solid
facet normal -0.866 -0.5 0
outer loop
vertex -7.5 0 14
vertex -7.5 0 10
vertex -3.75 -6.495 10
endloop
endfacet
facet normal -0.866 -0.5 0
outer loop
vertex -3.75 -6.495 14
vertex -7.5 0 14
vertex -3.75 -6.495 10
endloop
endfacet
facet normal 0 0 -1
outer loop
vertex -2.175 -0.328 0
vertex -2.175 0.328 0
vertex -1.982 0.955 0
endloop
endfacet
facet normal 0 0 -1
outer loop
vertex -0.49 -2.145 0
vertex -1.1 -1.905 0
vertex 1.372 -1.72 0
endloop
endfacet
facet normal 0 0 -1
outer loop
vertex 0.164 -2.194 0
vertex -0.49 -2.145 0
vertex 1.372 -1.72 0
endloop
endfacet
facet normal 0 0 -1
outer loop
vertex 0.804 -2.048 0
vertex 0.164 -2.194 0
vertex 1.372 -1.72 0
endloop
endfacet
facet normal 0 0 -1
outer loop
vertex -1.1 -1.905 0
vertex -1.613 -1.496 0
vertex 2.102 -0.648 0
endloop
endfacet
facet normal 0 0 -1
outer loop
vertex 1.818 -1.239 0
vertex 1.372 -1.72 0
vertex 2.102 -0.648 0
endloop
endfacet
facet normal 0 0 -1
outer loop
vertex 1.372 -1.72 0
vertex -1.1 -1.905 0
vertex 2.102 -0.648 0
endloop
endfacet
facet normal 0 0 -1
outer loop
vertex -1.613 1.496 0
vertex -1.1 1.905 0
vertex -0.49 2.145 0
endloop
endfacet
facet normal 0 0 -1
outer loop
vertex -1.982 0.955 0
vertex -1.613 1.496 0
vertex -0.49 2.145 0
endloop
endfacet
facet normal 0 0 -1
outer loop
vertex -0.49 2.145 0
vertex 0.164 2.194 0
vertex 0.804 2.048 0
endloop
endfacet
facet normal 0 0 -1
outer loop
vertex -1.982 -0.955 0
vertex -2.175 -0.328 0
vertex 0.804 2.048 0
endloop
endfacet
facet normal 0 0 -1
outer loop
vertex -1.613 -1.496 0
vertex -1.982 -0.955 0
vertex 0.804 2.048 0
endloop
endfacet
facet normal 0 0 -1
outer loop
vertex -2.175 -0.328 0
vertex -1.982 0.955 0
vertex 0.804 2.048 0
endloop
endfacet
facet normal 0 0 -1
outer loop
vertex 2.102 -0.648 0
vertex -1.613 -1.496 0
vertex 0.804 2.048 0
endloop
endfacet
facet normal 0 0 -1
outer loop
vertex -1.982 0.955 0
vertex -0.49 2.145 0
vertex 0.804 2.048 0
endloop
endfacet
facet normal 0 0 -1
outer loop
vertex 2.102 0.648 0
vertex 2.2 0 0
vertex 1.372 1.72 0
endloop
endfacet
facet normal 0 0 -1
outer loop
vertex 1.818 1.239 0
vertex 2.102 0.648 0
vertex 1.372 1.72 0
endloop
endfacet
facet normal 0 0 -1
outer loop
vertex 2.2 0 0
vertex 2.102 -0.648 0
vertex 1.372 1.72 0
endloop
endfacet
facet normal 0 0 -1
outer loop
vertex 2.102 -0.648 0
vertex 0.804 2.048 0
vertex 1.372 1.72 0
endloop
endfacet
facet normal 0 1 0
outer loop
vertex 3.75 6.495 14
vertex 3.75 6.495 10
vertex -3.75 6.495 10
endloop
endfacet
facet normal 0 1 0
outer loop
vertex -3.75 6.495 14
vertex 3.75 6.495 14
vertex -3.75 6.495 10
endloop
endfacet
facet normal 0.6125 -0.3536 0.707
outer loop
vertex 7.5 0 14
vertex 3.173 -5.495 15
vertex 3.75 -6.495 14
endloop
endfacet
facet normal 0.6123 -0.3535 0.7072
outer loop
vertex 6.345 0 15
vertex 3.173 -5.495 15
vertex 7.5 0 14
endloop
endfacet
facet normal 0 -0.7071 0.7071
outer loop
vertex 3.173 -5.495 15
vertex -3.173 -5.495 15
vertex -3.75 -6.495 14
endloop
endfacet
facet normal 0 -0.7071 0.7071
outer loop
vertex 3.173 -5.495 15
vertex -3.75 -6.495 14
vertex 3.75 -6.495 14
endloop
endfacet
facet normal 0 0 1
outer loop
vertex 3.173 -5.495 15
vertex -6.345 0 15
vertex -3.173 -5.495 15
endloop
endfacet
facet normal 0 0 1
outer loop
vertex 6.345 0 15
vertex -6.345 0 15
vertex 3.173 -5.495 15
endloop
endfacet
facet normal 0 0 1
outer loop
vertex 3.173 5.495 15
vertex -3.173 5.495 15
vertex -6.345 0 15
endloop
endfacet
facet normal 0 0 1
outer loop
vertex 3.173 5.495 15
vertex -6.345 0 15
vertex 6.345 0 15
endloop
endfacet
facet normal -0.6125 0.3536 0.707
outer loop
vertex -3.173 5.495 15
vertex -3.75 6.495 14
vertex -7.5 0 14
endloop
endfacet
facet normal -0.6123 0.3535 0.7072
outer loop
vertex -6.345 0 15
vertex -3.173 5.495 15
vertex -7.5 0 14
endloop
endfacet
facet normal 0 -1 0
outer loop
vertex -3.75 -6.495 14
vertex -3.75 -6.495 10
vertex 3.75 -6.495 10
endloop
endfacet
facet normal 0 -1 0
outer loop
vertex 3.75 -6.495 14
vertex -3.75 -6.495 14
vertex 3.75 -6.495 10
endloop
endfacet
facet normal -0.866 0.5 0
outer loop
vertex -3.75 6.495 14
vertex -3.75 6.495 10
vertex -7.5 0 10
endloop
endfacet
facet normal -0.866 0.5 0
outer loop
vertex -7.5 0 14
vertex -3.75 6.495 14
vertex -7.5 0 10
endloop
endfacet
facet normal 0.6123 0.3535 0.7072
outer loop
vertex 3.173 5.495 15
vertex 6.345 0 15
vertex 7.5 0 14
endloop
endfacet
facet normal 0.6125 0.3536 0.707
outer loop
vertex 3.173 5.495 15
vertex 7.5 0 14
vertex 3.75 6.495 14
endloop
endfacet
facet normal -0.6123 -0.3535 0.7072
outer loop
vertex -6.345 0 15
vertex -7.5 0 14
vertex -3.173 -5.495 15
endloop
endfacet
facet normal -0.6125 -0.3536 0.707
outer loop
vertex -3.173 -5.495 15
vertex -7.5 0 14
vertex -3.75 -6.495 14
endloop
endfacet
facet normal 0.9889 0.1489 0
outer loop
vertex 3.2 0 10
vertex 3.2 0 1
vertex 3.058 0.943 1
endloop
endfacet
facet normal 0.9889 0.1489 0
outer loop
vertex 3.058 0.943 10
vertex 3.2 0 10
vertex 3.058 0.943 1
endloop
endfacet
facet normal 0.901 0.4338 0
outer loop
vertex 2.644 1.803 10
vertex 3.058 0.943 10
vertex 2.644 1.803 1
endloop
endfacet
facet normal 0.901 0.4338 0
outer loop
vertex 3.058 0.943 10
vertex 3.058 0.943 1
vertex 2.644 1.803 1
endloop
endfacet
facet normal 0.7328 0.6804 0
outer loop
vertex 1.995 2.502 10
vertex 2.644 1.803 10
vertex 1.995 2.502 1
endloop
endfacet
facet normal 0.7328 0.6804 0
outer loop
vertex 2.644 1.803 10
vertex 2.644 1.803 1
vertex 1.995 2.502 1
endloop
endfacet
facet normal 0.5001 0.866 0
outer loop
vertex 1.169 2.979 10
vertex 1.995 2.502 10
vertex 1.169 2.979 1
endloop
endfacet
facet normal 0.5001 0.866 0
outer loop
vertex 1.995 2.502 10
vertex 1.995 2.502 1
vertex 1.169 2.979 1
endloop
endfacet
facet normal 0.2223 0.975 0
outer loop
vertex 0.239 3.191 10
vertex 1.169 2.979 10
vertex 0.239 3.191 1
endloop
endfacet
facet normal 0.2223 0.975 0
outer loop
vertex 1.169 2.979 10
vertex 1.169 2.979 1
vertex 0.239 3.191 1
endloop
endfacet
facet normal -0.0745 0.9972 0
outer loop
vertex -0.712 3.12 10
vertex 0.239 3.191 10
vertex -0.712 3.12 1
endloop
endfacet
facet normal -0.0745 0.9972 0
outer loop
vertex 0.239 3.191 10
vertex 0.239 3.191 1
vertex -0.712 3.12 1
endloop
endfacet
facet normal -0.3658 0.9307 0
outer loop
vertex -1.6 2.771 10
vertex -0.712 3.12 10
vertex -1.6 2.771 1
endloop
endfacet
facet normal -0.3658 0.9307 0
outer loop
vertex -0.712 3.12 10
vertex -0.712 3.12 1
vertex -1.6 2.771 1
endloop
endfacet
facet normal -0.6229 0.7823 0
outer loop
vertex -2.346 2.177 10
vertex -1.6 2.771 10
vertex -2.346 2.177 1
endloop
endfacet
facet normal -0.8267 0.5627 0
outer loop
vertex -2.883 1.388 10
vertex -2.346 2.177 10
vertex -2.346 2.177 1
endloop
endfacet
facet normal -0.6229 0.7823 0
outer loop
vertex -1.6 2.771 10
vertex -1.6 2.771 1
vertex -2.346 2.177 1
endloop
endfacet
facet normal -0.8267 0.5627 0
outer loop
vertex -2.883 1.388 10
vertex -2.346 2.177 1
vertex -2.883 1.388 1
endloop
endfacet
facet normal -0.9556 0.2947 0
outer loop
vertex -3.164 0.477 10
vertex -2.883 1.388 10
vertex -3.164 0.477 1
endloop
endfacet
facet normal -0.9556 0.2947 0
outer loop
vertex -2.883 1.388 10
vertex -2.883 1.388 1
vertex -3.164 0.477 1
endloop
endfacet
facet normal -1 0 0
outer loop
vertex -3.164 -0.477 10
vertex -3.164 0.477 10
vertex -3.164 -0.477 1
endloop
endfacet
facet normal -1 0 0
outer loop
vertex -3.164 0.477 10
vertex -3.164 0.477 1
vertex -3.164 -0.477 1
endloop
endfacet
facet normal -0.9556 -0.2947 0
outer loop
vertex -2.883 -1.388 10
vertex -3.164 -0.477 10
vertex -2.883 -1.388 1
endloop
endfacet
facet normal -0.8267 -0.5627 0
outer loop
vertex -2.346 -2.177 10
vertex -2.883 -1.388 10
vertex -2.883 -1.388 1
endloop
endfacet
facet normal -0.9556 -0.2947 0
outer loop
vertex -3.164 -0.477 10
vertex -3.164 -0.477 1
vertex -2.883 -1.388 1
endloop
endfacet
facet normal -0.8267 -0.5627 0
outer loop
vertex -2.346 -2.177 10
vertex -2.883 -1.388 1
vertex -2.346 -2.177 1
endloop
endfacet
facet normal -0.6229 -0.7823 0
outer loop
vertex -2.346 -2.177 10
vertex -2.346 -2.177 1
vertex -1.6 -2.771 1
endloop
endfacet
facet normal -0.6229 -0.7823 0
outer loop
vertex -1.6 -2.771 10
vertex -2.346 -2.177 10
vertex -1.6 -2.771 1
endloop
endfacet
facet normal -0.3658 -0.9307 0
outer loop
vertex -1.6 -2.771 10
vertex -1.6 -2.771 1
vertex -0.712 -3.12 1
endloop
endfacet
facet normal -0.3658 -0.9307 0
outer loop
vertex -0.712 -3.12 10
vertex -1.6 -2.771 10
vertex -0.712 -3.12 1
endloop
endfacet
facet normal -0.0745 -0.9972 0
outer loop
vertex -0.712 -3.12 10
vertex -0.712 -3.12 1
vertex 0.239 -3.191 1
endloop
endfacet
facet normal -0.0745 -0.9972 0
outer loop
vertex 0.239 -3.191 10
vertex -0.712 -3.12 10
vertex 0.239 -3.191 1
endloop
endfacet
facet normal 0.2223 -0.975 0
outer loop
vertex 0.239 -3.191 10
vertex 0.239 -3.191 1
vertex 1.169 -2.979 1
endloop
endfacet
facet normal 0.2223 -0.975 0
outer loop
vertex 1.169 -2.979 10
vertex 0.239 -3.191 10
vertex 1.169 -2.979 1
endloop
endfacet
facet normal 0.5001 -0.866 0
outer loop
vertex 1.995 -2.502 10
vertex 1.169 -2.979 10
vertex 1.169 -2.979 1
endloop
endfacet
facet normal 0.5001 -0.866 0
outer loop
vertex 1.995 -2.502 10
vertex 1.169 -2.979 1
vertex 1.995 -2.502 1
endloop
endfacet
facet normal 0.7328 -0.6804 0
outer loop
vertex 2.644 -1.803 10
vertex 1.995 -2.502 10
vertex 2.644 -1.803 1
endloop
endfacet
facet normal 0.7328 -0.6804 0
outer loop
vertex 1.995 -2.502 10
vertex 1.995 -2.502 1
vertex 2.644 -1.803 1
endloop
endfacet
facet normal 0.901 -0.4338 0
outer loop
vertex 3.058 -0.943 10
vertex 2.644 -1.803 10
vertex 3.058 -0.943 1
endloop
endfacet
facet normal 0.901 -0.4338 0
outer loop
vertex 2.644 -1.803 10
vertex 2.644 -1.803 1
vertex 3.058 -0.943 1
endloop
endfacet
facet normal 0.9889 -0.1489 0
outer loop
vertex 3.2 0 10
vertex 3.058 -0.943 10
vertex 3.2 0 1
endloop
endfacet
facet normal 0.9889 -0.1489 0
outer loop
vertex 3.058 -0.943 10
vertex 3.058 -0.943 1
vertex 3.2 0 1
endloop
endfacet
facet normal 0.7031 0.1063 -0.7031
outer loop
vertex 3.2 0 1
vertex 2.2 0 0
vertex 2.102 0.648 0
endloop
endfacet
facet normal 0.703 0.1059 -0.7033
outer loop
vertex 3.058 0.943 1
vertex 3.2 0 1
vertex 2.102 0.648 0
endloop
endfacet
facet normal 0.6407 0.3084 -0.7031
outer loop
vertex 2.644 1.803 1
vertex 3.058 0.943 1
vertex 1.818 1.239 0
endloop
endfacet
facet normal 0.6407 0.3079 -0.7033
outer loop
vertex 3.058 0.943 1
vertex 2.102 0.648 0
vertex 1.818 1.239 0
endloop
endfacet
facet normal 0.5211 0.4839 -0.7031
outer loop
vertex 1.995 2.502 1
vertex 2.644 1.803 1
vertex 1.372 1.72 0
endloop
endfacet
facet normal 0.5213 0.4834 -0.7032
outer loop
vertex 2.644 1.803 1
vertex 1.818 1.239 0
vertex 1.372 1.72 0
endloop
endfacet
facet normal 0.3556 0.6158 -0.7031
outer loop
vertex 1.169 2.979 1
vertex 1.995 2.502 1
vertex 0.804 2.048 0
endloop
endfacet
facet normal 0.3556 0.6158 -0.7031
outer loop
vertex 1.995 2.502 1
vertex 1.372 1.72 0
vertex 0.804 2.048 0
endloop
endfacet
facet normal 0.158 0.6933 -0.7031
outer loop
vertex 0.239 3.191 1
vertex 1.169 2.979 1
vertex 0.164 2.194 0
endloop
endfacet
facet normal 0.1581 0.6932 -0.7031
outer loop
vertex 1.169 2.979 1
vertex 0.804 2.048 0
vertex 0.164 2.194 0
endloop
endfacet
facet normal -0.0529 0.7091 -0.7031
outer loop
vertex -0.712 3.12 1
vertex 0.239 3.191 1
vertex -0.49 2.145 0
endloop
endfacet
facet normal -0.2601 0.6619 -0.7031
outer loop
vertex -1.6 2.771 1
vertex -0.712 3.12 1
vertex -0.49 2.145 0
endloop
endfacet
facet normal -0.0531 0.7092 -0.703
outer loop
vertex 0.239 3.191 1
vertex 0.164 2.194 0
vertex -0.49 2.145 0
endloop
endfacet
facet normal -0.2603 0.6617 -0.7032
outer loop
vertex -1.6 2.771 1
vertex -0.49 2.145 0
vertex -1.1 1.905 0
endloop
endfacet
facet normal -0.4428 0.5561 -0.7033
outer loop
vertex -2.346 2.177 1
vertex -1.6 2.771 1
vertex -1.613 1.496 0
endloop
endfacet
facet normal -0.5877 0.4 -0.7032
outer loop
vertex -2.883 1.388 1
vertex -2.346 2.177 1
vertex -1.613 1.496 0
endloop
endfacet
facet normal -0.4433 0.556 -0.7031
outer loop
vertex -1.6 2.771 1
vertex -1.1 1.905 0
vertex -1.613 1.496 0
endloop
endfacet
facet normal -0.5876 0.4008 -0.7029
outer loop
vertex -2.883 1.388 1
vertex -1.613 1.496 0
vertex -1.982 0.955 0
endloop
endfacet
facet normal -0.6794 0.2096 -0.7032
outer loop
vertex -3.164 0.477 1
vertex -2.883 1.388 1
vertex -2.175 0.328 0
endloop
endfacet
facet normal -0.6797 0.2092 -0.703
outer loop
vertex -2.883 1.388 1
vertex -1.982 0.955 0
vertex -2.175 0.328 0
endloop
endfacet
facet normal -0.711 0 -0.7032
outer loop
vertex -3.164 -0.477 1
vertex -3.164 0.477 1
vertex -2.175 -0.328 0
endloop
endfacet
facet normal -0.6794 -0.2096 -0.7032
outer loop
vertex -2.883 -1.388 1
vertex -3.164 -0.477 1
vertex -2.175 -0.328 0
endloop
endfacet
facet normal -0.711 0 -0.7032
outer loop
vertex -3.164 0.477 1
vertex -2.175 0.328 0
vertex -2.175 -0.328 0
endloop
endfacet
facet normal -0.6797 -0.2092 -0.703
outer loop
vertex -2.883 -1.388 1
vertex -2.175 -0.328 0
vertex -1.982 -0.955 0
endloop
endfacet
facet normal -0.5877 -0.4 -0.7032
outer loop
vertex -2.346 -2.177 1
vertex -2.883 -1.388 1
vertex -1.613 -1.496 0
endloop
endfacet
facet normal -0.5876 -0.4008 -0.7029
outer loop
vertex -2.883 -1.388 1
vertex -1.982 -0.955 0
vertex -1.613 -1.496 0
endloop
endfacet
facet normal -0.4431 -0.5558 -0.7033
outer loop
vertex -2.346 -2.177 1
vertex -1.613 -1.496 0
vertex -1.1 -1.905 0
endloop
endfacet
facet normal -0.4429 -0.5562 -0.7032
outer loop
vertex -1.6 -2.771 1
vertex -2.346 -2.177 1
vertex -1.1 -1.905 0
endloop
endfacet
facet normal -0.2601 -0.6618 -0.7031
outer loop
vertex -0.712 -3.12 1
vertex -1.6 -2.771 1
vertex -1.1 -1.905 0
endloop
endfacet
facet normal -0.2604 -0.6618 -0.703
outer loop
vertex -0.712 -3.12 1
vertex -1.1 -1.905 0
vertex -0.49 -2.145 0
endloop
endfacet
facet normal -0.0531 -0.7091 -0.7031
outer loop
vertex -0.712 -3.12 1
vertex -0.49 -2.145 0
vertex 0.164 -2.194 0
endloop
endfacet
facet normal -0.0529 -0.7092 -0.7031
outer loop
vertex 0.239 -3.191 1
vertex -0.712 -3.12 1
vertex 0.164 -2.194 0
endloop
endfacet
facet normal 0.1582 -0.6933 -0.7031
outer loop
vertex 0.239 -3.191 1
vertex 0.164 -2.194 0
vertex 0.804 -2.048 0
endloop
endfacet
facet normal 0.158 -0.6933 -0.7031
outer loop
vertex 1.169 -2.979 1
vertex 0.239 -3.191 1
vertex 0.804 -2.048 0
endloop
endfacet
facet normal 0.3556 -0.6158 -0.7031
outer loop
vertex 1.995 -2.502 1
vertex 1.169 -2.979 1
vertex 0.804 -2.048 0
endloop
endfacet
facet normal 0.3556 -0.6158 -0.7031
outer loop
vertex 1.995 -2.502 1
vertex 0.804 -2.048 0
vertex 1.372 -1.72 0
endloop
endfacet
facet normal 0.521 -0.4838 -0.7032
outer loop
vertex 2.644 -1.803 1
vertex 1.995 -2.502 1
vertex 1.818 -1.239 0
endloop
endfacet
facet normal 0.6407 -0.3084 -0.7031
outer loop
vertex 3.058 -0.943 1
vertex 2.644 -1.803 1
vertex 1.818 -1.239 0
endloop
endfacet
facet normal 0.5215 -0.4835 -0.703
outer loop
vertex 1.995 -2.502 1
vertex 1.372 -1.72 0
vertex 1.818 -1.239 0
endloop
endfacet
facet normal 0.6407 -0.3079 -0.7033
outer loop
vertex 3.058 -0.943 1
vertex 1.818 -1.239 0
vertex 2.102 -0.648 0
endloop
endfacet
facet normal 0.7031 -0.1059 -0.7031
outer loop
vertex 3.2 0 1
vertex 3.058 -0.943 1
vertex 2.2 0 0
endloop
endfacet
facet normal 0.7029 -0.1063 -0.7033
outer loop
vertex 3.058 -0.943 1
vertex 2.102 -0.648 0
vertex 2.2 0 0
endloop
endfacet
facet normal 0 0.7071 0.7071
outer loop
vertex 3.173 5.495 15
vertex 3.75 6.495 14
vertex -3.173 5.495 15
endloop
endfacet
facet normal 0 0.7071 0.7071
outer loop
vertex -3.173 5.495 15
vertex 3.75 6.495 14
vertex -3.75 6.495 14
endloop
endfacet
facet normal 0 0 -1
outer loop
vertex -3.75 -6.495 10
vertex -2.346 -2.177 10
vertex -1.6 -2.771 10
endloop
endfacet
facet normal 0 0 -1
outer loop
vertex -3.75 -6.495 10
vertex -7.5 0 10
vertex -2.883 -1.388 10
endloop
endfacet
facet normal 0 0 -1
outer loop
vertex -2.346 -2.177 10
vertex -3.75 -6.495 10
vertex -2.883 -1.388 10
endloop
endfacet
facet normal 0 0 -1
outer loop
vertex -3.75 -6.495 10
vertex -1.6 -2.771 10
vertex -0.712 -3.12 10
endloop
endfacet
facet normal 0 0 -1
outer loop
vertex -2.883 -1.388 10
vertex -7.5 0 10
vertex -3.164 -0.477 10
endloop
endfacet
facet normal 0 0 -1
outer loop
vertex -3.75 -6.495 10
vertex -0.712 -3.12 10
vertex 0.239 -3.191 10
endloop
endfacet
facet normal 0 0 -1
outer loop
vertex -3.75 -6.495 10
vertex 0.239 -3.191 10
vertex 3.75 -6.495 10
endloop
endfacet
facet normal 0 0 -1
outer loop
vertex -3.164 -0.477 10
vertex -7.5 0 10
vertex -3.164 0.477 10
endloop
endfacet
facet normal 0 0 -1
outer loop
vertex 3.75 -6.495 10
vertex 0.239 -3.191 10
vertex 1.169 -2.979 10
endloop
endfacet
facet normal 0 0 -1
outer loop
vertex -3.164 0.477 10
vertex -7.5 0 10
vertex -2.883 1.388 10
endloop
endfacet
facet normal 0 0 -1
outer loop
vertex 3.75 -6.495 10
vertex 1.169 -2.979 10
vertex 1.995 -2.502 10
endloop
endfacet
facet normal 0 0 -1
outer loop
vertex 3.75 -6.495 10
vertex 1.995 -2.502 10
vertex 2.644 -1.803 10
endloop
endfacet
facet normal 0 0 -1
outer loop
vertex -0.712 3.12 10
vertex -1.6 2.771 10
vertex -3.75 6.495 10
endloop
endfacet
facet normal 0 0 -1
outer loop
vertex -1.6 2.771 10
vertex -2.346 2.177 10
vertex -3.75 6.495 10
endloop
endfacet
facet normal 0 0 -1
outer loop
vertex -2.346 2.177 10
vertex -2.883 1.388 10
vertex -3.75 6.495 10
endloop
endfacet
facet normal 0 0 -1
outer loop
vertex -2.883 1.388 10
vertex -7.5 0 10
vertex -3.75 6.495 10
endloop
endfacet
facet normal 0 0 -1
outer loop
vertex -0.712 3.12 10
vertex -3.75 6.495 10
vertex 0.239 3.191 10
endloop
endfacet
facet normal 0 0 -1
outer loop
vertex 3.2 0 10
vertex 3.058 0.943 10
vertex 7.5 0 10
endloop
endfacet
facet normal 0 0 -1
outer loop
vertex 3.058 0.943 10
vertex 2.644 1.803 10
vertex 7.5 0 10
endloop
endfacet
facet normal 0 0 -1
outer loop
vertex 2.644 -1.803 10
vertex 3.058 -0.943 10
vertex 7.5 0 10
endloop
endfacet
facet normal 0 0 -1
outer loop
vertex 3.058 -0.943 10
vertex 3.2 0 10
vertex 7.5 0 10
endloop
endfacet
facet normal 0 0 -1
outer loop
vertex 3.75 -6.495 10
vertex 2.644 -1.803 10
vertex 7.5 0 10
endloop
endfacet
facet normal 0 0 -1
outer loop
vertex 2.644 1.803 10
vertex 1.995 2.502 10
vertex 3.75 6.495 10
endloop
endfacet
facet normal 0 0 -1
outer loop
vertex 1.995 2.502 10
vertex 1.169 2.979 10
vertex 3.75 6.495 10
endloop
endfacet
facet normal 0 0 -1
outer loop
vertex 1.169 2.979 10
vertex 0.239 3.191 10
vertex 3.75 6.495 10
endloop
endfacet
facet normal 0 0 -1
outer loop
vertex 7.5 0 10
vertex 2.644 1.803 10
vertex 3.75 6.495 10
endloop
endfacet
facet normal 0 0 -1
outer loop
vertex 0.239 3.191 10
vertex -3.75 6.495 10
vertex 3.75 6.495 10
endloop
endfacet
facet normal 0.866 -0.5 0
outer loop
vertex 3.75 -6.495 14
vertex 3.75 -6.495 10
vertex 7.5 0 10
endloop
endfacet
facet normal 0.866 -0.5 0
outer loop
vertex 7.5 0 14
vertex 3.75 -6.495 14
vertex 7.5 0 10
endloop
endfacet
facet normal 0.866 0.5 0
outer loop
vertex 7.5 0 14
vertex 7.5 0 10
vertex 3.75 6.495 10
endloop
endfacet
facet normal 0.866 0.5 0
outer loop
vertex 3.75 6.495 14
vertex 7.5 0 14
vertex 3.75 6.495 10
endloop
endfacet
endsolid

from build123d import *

# Parameters (mm, degrees)
F0_R     = 3.2
F1_DEPTH = 10
F2_R     = 3.2
F3_DEPTH = 5
F4_SIZE  = 1


with BuildPart() as f1:
    # F0 (on Top) → F1 (new body)
    with BuildSketch(Plane.XY):
        Circle(F0_R)
    extrude(amount=F1_DEPTH)

    # F2 (on face) → F3 (join)
    with BuildSketch(Plane.XY.offset(10)):
        Polygon((3.75, -6.495191), (7.5, 0), (3.75, 6.495191), (-3.75, 6.495191), (-7.5, 0), (-3.75, -6.495191), align=None)
        Circle(F2_R, mode=Mode.SUBTRACT)
        Circle(F2_R)
    extrude(amount=F3_DEPTH)

    # F4
    f4_edges = [f1.edges().sort_by_distance(p)[0] for p in [
        (0, -6.495191, 15),
        (5.625, -3.247595, 15),
        (5.625, 3.247595, 15),
        (0, 6.495191, 15),
        (-5.625, 3.247595, 15),
        (-5.625, -3.247595, 15),
        (-3.2, 0, 0),
    ]]
    chamfer(f4_edges, length=F4_SIZE)


solid = f1.part
